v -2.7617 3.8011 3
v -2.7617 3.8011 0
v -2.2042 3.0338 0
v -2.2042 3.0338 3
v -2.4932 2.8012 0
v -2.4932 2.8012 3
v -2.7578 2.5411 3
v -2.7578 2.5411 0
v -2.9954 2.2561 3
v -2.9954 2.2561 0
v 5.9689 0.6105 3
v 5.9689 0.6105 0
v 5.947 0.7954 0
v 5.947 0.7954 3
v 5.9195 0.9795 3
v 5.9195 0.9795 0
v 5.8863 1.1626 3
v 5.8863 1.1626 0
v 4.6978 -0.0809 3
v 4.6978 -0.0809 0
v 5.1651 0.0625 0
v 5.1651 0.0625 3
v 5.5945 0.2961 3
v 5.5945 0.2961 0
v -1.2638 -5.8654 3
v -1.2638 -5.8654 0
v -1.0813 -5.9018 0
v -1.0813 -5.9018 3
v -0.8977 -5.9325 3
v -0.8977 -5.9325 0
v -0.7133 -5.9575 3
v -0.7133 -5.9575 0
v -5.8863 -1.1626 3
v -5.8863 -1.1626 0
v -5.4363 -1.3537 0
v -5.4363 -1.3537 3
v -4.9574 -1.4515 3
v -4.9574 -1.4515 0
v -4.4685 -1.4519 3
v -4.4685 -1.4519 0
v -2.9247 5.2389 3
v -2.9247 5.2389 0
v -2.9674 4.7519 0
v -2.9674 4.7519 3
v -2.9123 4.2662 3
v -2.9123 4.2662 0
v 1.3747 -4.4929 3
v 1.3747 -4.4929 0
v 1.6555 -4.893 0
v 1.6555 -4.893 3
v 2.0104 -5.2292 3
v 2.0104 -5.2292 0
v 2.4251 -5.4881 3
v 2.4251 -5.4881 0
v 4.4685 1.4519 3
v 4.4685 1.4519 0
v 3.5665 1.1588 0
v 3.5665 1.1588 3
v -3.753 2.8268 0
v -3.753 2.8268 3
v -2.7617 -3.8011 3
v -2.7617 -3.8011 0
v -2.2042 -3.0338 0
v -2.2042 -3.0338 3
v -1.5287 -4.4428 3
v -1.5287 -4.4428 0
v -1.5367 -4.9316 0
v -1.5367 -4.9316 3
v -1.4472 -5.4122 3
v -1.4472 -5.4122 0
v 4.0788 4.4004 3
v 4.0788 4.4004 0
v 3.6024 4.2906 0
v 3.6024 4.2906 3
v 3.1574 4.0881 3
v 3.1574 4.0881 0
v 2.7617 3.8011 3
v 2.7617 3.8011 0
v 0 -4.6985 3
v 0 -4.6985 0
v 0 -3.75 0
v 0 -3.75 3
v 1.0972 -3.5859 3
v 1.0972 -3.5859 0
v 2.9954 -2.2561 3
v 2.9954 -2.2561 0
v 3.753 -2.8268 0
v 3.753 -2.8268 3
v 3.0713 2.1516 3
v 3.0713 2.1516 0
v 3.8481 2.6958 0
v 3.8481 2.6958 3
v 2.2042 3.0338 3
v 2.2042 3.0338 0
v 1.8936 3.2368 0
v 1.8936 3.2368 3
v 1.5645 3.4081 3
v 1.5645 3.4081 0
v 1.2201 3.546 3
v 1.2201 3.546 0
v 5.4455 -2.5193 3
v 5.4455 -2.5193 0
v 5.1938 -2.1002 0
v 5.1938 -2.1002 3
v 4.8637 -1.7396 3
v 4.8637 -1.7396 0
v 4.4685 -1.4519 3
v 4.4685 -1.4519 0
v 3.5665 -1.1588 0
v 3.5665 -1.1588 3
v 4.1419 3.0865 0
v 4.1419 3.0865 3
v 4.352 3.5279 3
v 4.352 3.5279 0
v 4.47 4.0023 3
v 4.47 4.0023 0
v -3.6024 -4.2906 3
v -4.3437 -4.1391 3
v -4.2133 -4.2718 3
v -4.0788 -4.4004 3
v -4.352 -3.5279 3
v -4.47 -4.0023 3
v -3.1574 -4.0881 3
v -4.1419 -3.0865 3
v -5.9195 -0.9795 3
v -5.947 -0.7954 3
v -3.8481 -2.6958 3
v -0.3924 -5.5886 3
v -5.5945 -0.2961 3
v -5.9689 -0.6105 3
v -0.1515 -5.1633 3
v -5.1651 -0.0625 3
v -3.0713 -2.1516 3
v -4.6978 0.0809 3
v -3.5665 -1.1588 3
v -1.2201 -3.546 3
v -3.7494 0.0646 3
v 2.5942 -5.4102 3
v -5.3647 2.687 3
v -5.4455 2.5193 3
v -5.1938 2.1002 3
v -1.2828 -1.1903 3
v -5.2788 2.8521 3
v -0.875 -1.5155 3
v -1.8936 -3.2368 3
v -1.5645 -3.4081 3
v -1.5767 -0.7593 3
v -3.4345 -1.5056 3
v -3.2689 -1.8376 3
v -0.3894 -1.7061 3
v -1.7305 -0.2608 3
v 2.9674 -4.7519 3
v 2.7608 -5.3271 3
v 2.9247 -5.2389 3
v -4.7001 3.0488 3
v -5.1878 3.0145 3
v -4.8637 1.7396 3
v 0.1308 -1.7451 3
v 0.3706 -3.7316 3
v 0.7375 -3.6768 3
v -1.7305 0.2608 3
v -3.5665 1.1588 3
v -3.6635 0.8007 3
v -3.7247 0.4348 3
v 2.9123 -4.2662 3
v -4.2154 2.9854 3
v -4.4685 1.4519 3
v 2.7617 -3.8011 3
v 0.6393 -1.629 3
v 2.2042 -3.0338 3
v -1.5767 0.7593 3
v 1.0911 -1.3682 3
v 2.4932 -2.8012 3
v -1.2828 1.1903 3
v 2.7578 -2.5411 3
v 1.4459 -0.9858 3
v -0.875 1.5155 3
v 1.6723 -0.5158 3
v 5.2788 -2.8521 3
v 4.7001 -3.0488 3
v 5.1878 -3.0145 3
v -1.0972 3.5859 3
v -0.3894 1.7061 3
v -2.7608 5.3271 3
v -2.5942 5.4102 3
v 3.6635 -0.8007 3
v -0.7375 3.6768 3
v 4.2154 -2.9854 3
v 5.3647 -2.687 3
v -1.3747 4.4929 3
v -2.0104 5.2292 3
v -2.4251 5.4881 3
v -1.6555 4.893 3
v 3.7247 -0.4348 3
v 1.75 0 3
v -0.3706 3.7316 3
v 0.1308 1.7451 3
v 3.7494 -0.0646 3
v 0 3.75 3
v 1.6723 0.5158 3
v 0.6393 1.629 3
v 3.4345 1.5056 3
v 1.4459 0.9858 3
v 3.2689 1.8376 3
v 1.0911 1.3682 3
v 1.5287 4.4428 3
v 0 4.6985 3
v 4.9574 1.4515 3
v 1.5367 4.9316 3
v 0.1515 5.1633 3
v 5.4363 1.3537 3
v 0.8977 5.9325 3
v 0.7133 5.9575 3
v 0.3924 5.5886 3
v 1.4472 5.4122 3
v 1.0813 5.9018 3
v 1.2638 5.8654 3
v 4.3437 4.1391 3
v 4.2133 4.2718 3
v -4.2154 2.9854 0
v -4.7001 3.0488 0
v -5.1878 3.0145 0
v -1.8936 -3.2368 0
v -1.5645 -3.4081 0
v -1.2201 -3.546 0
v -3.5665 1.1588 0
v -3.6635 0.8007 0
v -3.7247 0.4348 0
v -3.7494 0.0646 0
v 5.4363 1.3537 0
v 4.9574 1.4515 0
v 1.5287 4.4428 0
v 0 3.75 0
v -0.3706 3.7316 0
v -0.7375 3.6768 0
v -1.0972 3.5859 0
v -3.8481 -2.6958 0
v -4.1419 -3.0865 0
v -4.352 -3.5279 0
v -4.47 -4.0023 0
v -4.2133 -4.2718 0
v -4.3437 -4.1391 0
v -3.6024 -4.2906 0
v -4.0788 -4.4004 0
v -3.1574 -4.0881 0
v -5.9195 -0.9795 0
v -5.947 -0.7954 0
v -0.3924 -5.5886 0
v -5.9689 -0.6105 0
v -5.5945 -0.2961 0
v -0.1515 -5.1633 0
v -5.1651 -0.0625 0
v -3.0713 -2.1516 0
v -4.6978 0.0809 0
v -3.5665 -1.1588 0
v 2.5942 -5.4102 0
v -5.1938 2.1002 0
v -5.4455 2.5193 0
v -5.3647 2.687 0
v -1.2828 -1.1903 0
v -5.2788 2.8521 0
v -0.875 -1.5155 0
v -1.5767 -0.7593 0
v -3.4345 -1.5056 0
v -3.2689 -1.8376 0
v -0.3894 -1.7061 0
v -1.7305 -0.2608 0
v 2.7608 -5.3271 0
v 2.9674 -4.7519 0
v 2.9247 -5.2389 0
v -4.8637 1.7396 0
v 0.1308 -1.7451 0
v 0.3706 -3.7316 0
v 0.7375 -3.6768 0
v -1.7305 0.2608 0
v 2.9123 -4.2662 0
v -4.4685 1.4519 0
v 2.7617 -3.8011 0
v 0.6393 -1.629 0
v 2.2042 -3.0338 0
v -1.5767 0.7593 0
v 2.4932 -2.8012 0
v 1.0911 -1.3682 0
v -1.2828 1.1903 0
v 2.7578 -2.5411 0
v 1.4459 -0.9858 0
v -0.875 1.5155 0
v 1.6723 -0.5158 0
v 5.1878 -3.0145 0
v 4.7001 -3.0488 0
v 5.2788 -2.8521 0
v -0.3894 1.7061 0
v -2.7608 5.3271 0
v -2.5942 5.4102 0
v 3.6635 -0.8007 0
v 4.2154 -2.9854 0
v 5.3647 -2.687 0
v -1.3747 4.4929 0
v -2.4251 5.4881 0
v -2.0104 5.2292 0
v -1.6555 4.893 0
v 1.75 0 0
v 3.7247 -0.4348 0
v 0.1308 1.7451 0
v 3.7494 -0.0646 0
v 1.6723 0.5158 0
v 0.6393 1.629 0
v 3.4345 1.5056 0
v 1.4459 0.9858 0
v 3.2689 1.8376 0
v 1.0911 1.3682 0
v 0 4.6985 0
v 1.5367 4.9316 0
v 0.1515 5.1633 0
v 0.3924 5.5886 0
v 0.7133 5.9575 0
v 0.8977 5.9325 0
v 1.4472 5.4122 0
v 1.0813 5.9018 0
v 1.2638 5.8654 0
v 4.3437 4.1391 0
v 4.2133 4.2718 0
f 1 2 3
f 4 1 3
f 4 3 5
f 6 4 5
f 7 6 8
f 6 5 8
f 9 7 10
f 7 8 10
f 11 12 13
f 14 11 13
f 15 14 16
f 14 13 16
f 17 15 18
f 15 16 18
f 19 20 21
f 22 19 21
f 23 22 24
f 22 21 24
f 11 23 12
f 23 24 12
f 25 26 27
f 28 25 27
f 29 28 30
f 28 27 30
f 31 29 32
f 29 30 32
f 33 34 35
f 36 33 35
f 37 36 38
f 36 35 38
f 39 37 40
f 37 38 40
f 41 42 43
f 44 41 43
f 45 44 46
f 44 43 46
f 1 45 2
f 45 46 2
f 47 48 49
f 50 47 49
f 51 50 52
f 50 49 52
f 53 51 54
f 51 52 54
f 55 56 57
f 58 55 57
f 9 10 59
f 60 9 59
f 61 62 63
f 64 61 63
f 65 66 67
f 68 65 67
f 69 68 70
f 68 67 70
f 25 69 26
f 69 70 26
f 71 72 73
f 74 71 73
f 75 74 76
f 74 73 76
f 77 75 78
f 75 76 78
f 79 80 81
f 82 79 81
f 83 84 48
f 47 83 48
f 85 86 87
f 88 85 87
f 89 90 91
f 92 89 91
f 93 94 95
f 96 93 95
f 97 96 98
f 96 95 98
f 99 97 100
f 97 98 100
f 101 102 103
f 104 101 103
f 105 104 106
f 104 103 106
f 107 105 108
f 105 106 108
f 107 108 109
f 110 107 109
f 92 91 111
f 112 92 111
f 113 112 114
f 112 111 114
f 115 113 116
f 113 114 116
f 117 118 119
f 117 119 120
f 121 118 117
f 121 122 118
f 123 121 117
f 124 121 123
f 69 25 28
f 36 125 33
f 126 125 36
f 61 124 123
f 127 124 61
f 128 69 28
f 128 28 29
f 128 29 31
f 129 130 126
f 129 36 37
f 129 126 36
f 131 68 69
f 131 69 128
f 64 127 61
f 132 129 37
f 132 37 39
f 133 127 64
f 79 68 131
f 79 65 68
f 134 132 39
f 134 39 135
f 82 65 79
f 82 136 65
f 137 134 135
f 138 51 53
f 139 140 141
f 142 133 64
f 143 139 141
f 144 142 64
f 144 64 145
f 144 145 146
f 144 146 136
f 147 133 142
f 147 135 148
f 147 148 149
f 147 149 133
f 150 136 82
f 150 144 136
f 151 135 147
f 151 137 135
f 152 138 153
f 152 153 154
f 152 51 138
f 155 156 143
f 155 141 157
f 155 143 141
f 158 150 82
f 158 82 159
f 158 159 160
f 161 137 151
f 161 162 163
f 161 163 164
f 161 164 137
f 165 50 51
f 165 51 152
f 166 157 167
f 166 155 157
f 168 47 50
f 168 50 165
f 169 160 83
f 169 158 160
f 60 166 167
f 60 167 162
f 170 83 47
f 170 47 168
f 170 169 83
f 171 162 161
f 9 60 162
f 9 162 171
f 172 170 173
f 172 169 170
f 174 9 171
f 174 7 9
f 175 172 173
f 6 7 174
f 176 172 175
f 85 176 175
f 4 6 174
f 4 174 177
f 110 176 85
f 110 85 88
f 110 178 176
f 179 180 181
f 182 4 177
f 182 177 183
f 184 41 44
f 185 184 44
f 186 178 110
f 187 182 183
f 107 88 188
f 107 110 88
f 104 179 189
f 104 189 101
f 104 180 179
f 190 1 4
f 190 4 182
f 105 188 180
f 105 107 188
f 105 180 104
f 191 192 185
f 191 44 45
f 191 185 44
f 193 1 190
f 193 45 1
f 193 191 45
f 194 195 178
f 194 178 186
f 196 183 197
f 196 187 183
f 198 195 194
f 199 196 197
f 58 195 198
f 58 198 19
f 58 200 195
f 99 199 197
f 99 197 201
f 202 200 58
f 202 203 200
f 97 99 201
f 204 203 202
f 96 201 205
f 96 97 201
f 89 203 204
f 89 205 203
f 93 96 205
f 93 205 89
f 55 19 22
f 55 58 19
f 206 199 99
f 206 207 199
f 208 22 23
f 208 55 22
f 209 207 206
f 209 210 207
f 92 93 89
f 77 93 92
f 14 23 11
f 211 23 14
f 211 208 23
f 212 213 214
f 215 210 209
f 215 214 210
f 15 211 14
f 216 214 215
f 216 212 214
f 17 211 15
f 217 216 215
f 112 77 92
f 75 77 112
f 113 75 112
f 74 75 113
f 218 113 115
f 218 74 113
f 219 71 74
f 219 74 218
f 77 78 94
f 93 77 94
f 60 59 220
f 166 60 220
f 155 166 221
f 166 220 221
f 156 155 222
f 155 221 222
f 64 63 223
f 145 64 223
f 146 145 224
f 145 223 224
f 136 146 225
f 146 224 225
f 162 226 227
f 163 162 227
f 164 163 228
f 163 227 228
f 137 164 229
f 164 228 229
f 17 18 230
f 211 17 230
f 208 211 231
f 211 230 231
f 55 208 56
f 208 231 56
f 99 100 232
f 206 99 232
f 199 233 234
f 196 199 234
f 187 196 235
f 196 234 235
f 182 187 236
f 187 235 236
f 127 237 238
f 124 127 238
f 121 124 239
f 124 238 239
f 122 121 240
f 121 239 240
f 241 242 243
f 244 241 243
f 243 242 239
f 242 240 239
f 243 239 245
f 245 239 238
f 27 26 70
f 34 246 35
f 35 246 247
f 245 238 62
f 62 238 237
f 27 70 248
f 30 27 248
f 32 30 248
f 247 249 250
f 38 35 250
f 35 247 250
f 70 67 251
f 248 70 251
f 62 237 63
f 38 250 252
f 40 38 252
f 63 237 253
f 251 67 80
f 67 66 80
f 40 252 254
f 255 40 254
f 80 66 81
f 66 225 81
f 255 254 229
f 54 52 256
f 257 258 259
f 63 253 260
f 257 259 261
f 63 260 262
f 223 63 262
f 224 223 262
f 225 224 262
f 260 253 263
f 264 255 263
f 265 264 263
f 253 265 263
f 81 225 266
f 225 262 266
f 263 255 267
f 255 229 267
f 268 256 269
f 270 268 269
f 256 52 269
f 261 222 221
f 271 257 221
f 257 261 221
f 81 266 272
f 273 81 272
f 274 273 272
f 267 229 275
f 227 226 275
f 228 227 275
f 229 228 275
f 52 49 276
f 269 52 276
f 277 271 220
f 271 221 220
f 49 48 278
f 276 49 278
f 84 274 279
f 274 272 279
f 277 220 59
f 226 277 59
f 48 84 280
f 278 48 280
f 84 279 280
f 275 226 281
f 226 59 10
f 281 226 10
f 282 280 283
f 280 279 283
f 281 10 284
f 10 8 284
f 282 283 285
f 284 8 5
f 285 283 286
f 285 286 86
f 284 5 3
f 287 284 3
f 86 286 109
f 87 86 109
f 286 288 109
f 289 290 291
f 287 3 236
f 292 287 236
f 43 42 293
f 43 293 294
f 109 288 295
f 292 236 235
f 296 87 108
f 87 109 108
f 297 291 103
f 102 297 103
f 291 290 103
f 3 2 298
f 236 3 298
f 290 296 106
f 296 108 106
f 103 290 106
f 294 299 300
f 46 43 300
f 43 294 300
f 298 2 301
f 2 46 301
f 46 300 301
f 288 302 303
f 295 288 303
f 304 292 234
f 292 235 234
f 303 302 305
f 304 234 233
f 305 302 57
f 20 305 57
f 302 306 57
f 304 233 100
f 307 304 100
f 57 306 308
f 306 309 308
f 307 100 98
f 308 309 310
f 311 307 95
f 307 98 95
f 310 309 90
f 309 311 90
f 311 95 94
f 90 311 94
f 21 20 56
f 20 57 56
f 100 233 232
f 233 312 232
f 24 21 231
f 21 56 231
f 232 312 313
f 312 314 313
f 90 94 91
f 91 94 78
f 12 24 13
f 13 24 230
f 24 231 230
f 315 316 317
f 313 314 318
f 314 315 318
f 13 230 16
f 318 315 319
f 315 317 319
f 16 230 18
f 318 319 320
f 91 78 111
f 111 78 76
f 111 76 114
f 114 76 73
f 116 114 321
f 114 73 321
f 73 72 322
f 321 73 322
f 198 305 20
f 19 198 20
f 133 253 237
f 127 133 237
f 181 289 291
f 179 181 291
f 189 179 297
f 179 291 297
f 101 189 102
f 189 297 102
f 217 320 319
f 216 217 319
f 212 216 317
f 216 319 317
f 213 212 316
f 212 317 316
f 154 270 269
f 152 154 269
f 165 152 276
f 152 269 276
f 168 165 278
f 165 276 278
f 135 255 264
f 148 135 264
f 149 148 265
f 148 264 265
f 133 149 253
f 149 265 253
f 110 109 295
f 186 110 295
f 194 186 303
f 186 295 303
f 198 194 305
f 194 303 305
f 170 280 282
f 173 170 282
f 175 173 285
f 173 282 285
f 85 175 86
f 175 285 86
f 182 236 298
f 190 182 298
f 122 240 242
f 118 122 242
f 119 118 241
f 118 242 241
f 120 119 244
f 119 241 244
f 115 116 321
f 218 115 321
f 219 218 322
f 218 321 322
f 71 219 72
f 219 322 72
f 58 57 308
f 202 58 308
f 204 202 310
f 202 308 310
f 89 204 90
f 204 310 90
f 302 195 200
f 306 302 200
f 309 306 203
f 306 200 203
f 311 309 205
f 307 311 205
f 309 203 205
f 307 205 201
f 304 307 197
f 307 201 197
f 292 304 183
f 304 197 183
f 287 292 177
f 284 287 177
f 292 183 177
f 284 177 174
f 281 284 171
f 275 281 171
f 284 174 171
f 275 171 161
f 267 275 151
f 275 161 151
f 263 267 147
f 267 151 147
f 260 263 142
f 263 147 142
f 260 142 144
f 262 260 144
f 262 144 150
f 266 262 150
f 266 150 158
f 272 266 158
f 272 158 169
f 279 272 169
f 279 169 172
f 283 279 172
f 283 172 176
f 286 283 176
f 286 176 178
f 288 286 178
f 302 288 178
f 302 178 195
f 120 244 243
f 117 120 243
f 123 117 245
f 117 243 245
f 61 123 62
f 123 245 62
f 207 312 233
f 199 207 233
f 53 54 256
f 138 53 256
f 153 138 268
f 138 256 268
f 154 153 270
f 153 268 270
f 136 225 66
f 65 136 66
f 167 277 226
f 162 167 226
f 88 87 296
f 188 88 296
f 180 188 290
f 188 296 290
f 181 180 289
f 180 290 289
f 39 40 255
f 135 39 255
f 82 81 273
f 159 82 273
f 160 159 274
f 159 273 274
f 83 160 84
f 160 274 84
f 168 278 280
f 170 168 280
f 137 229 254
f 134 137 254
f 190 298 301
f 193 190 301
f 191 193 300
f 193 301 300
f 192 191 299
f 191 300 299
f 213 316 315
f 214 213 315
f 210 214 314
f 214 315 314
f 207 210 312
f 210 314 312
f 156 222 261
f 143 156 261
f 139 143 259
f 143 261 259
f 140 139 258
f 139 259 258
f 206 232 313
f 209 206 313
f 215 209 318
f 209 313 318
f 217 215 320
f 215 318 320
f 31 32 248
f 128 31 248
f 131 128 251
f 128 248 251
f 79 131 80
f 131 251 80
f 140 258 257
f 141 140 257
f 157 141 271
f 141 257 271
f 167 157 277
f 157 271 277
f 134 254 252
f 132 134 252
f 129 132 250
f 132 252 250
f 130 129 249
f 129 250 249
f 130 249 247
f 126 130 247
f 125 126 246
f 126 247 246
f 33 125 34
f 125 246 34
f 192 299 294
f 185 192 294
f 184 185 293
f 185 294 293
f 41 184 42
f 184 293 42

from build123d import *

# Parameters (mm, degrees)
BOSS_EXTRU_1_DEPTH           = 3
R_P_TITION_CIRCULAIRE2_COUNT = 10
ESQUISSE5_R                  = 3.75
BOSS_EXTRU_2_DEPTH           = 3
ESQUISSE6_R                  = 1.75
ENL_V_MAT_EXTRU_1_DEPTH      = 4


with BuildPart() as part:
    # Esquisse4 → Boss.-Extru.1 (new body)
    with BuildSketch(Plane.XY):
        with BuildLine():
            Line((0, 4.698463104), (0, 3.75))
            ThreePointArc((0, 3.75), (0.618511546, 3.69864076), (1.220081074, 3.54596985))
            Line((1.220081074, 3.54596985), (1.528668242, 4.442828935))
            ThreePointArc((1.528668242, 4.442828935), (1.503976571, 5.174164178), (1.263823322, 5.865385802))
            ThreePointArc((1.263823322, 5.865385802), (0.989618473, 5.917825215), (0.71327115, 5.957452834))
            ThreePointArc((0.71327115, 5.957452834), (0.261291789, 5.381974273), (0, 4.698463104))
        make_face()
    extrude(amount=BOSS_EXTRU_1_DEPTH)


with BuildPart() as r_p_tition_circulaire2_1:
    # Répétition circulaire2: pattern copy
    add(part.part.rotate(Axis((0, 0, 0), (0, 0, 1)), 1 * 360 / R_P_TITION_CIRCULAIRE2_COUNT))


with BuildPart() as r_p_tition_circulaire2_2:
    # Répétition circulaire2: pattern copy
    add(part.part.rotate(Axis((0, 0, 0), (0, 0, 1)), 2 * 360 / R_P_TITION_CIRCULAIRE2_COUNT))


with BuildPart() as r_p_tition_circulaire2_3:
    # Répétition circulaire2: pattern copy
    add(part.part.rotate(Axis((0, 0, 0), (0, 0, 1)), 3 * 360 / R_P_TITION_CIRCULAIRE2_COUNT))


with BuildPart() as r_p_tition_circulaire2_4:
    # Répétition circulaire2: pattern copy
    add(part.part.rotate(Axis((0, 0, 0), (0, 0, 1)), 4 * 360 / R_P_TITION_CIRCULAIRE2_COUNT))


with BuildPart() as r_p_tition_circulaire2_5:
    # Répétition circulaire2: pattern copy
    add(part.part.rotate(Axis((0, 0, 0), (0, 0, 1)), 5 * 360 / R_P_TITION_CIRCULAIRE2_COUNT))


with BuildPart() as r_p_tition_circulaire2_6:
    # Répétition circulaire2: pattern copy
    add(part.part.rotate(Axis((0, 0, 0), (0, 0, 1)), 6 * 360 / R_P_TITION_CIRCULAIRE2_COUNT))


with BuildPart() as r_p_tition_circulaire2_7:
    # Répétition circulaire2: pattern copy
    add(part.part.rotate(Axis((0, 0, 0), (0, 0, 1)), 7 * 360 / R_P_TITION_CIRCULAIRE2_COUNT))


with BuildPart() as r_p_tition_circulaire2_8:
    # Répétition circulaire2: pattern copy
    add(part.part.rotate(Axis((0, 0, 0), (0, 0, 1)), 8 * 360 / R_P_TITION_CIRCULAIRE2_COUNT))


with BuildPart() as r_p_tition_circulaire2_9:
    # Répétition circulaire2: pattern copy
    add(part.part.rotate(Axis((0, 0, 0), (0, 0, 1)), 9 * 360 / R_P_TITION_CIRCULAIRE2_COUNT))


with BuildPart() as part_1:
    add(part.part)

    add(r_p_tition_circulaire2_1.part)  # Boss.-Extru.2 merges Répétition circulaire2_1

    add(r_p_tition_circulaire2_2.part)  # Boss.-Extru.2 merges Répétition circulaire2_2

    add(r_p_tition_circulaire2_3.part)  # Boss.-Extru.2 merges Répétition circulaire2_3

    add(r_p_tition_circulaire2_4.part)  # Boss.-Extru.2 merges Répétition circulaire2_4

    add(r_p_tition_circulaire2_5.part)  # Boss.-Extru.2 merges Répétition circulaire2_5

    add(r_p_tition_circulaire2_6.part)  # Boss.-Extru.2 merges Répétition circulaire2_6

    add(r_p_tition_circulaire2_7.part)  # Boss.-Extru.2 merges Répétition circulaire2_7

    add(r_p_tition_circulaire2_8.part)  # Boss.-Extru.2 merges Répétition circulaire2_8

    add(r_p_tition_circulaire2_9.part)  # Boss.-Extru.2 merges Répétition circulaire2_9
    # Esquisse5 → Boss.-Extru.2 (add)
    with BuildSketch(Plane.XY):
        Circle(ESQUISSE5_R)
    extrude(amount=BOSS_EXTRU_2_DEPTH)

    # Esquisse6 → Enlèv. mat.-Extru.1 (cut, through all)
    with BuildSketch(Plane.XY.offset(3)):
        Circle(ESQUISSE6_R)
    extrude(amount=-ENL_V_MAT_EXTRU_1_DEPTH, mode=Mode.SUBTRACT)


solid = part_1.part
